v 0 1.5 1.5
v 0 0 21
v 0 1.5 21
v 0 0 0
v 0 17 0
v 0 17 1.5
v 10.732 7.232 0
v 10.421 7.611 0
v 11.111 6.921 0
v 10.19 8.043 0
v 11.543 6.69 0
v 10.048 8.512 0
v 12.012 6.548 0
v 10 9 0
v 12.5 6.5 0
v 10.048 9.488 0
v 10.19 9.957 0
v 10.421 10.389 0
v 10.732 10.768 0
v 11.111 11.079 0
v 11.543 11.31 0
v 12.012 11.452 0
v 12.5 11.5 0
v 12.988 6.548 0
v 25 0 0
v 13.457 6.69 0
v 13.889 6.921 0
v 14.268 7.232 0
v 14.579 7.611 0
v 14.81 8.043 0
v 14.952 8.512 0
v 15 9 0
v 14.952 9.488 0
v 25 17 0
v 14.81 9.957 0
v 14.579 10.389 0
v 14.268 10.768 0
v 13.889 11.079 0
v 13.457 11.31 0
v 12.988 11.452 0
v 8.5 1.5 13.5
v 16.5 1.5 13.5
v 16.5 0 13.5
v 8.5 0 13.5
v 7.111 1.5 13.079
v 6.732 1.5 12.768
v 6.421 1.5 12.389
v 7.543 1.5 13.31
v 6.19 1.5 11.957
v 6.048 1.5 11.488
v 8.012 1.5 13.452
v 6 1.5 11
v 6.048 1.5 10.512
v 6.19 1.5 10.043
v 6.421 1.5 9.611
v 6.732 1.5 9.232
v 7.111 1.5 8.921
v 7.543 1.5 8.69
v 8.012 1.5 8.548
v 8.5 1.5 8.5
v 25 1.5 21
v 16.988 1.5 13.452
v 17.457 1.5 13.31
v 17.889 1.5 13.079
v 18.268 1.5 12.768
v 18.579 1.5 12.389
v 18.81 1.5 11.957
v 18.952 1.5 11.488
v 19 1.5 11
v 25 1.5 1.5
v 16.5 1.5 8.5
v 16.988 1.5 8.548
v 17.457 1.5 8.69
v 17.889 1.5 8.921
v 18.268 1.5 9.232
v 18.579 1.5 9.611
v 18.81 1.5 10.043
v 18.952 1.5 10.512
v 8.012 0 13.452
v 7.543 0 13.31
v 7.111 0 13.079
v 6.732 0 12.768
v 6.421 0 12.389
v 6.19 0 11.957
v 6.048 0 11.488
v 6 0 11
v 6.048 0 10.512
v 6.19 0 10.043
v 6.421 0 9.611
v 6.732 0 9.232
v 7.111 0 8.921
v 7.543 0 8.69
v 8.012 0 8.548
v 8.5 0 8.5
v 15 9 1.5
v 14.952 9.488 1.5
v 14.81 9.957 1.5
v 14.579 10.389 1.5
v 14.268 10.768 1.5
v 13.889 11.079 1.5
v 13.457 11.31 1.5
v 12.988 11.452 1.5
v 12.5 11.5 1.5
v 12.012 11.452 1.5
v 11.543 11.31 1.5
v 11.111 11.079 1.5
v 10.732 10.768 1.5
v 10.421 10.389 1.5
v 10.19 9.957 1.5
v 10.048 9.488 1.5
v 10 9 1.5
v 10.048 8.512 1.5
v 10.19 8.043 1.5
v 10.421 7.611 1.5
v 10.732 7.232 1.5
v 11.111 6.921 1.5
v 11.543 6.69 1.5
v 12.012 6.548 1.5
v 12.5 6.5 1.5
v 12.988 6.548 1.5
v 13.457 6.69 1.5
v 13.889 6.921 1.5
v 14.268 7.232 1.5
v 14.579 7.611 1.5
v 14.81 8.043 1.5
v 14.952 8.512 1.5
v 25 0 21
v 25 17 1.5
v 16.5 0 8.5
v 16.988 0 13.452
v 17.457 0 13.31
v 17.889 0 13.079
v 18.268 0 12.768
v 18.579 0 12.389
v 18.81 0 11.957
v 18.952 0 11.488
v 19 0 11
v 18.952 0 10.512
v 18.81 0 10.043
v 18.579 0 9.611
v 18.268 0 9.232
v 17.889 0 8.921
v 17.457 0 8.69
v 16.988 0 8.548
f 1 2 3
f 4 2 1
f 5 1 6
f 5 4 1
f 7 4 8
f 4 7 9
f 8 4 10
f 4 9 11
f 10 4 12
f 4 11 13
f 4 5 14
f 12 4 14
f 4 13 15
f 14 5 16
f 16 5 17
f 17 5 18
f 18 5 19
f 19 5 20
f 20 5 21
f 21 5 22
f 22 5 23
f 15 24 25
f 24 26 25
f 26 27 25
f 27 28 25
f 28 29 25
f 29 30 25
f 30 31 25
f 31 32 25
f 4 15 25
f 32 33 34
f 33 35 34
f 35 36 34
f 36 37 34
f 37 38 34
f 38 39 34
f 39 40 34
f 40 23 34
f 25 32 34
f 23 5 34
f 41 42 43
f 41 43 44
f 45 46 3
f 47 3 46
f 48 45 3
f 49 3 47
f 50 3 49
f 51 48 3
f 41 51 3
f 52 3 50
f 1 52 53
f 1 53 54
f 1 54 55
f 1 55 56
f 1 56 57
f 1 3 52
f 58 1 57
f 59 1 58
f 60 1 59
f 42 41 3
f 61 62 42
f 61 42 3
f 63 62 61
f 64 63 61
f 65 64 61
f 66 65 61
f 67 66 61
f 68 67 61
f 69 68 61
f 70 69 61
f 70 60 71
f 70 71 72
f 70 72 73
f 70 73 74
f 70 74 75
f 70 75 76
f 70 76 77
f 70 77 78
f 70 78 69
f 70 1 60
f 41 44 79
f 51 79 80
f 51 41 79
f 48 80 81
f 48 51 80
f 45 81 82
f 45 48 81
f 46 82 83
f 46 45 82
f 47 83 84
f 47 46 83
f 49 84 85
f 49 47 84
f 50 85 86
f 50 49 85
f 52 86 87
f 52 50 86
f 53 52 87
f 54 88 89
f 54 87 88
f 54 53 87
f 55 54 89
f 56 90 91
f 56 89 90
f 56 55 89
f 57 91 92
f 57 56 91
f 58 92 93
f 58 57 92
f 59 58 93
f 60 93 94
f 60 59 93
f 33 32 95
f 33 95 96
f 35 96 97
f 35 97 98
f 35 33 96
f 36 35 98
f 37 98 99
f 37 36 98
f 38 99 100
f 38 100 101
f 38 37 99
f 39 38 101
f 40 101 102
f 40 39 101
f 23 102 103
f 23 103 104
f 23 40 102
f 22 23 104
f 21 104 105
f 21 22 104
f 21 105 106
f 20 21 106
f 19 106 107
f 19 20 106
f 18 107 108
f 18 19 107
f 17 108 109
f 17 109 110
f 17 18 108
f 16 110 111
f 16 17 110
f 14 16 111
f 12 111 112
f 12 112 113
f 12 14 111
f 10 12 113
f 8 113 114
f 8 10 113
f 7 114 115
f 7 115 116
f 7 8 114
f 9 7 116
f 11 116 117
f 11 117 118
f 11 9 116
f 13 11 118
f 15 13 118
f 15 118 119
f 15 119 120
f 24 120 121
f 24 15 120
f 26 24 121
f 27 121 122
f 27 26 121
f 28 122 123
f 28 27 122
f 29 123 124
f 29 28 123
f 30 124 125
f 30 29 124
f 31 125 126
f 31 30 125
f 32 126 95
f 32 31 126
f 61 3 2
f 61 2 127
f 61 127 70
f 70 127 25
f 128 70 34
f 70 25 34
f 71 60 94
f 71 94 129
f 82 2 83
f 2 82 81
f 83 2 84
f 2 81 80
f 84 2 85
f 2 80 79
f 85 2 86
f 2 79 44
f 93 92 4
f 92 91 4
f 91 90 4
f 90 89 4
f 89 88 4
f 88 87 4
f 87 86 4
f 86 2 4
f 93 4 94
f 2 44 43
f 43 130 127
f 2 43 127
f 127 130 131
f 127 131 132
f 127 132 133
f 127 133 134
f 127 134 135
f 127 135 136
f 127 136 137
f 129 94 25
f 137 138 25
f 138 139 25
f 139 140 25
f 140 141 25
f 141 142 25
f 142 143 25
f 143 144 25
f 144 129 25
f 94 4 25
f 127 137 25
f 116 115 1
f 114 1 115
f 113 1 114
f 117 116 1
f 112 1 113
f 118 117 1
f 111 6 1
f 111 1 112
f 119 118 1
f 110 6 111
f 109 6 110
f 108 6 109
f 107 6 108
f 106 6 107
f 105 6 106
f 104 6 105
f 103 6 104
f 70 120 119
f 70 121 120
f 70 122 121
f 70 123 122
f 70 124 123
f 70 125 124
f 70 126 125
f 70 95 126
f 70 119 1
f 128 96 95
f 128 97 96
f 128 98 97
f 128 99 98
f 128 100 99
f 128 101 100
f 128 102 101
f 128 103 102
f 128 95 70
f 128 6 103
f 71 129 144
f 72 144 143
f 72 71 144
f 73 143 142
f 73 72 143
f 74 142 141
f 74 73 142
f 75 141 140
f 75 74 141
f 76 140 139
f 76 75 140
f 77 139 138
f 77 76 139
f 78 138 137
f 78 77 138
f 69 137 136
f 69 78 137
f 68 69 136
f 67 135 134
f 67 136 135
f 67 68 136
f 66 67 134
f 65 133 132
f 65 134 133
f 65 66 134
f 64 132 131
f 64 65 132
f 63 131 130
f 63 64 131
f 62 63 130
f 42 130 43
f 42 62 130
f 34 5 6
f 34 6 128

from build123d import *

# Parameters (mm, degrees)
SKETCH_1_W          = 25
SKETCH_1_H          = 17
SKETCH_1_R          = 2.5
EXTRUDE_1_DEPTH     = 1.5
SKETCH_2_W          = 25
SKETCH_2_H          = 1.5
EXTRUDE_2_DEPTH     = 19.5
CUT_EXTRUDE_1_DEPTH = 19.5


with BuildPart() as part:
    # 스케치1 → 보스-돌출1 (new body)
    with BuildSketch(Plane.XY):
        with Locations((12.5, 8.5)):
            Rectangle(SKETCH_1_W, SKETCH_1_H)
        with Locations((12.5, 9)):
            Circle(SKETCH_1_R, mode=Mode.SUBTRACT)
    extrude(amount=EXTRUDE_1_DEPTH)

    # 스케치2 → 보스-돌출2 (add)
    with BuildSketch(Plane.XY.offset(1.5)):
        with Locations((12.5, 0.75)):
            Rectangle(SKETCH_2_W, SKETCH_2_H)
    extrude(amount=EXTRUDE_2_DEPTH)

    # 스케치3 → 컷-돌출1 (cut)
    with BuildSketch(Plane(origin=(0, 1.5, 0), x_dir=(1, 0, 0), z_dir=(0, 1, 0))):
        with BuildLine():
            Line((8.5, -8.5), (16.5, -8.5))
            ThreePointArc((16.5, -8.5), (19, -11), (16.5, -13.5))
            Line((16.5, -13.5), (8.5, -13.5))
            ThreePointArc((8.5, -13.5), (6, -11), (8.5, -8.5))
        make_face()
    extrude(amount=-CUT_EXTRUDE_1_DEPTH, mode=Mode.SUBTRACT)


solid = part.part
